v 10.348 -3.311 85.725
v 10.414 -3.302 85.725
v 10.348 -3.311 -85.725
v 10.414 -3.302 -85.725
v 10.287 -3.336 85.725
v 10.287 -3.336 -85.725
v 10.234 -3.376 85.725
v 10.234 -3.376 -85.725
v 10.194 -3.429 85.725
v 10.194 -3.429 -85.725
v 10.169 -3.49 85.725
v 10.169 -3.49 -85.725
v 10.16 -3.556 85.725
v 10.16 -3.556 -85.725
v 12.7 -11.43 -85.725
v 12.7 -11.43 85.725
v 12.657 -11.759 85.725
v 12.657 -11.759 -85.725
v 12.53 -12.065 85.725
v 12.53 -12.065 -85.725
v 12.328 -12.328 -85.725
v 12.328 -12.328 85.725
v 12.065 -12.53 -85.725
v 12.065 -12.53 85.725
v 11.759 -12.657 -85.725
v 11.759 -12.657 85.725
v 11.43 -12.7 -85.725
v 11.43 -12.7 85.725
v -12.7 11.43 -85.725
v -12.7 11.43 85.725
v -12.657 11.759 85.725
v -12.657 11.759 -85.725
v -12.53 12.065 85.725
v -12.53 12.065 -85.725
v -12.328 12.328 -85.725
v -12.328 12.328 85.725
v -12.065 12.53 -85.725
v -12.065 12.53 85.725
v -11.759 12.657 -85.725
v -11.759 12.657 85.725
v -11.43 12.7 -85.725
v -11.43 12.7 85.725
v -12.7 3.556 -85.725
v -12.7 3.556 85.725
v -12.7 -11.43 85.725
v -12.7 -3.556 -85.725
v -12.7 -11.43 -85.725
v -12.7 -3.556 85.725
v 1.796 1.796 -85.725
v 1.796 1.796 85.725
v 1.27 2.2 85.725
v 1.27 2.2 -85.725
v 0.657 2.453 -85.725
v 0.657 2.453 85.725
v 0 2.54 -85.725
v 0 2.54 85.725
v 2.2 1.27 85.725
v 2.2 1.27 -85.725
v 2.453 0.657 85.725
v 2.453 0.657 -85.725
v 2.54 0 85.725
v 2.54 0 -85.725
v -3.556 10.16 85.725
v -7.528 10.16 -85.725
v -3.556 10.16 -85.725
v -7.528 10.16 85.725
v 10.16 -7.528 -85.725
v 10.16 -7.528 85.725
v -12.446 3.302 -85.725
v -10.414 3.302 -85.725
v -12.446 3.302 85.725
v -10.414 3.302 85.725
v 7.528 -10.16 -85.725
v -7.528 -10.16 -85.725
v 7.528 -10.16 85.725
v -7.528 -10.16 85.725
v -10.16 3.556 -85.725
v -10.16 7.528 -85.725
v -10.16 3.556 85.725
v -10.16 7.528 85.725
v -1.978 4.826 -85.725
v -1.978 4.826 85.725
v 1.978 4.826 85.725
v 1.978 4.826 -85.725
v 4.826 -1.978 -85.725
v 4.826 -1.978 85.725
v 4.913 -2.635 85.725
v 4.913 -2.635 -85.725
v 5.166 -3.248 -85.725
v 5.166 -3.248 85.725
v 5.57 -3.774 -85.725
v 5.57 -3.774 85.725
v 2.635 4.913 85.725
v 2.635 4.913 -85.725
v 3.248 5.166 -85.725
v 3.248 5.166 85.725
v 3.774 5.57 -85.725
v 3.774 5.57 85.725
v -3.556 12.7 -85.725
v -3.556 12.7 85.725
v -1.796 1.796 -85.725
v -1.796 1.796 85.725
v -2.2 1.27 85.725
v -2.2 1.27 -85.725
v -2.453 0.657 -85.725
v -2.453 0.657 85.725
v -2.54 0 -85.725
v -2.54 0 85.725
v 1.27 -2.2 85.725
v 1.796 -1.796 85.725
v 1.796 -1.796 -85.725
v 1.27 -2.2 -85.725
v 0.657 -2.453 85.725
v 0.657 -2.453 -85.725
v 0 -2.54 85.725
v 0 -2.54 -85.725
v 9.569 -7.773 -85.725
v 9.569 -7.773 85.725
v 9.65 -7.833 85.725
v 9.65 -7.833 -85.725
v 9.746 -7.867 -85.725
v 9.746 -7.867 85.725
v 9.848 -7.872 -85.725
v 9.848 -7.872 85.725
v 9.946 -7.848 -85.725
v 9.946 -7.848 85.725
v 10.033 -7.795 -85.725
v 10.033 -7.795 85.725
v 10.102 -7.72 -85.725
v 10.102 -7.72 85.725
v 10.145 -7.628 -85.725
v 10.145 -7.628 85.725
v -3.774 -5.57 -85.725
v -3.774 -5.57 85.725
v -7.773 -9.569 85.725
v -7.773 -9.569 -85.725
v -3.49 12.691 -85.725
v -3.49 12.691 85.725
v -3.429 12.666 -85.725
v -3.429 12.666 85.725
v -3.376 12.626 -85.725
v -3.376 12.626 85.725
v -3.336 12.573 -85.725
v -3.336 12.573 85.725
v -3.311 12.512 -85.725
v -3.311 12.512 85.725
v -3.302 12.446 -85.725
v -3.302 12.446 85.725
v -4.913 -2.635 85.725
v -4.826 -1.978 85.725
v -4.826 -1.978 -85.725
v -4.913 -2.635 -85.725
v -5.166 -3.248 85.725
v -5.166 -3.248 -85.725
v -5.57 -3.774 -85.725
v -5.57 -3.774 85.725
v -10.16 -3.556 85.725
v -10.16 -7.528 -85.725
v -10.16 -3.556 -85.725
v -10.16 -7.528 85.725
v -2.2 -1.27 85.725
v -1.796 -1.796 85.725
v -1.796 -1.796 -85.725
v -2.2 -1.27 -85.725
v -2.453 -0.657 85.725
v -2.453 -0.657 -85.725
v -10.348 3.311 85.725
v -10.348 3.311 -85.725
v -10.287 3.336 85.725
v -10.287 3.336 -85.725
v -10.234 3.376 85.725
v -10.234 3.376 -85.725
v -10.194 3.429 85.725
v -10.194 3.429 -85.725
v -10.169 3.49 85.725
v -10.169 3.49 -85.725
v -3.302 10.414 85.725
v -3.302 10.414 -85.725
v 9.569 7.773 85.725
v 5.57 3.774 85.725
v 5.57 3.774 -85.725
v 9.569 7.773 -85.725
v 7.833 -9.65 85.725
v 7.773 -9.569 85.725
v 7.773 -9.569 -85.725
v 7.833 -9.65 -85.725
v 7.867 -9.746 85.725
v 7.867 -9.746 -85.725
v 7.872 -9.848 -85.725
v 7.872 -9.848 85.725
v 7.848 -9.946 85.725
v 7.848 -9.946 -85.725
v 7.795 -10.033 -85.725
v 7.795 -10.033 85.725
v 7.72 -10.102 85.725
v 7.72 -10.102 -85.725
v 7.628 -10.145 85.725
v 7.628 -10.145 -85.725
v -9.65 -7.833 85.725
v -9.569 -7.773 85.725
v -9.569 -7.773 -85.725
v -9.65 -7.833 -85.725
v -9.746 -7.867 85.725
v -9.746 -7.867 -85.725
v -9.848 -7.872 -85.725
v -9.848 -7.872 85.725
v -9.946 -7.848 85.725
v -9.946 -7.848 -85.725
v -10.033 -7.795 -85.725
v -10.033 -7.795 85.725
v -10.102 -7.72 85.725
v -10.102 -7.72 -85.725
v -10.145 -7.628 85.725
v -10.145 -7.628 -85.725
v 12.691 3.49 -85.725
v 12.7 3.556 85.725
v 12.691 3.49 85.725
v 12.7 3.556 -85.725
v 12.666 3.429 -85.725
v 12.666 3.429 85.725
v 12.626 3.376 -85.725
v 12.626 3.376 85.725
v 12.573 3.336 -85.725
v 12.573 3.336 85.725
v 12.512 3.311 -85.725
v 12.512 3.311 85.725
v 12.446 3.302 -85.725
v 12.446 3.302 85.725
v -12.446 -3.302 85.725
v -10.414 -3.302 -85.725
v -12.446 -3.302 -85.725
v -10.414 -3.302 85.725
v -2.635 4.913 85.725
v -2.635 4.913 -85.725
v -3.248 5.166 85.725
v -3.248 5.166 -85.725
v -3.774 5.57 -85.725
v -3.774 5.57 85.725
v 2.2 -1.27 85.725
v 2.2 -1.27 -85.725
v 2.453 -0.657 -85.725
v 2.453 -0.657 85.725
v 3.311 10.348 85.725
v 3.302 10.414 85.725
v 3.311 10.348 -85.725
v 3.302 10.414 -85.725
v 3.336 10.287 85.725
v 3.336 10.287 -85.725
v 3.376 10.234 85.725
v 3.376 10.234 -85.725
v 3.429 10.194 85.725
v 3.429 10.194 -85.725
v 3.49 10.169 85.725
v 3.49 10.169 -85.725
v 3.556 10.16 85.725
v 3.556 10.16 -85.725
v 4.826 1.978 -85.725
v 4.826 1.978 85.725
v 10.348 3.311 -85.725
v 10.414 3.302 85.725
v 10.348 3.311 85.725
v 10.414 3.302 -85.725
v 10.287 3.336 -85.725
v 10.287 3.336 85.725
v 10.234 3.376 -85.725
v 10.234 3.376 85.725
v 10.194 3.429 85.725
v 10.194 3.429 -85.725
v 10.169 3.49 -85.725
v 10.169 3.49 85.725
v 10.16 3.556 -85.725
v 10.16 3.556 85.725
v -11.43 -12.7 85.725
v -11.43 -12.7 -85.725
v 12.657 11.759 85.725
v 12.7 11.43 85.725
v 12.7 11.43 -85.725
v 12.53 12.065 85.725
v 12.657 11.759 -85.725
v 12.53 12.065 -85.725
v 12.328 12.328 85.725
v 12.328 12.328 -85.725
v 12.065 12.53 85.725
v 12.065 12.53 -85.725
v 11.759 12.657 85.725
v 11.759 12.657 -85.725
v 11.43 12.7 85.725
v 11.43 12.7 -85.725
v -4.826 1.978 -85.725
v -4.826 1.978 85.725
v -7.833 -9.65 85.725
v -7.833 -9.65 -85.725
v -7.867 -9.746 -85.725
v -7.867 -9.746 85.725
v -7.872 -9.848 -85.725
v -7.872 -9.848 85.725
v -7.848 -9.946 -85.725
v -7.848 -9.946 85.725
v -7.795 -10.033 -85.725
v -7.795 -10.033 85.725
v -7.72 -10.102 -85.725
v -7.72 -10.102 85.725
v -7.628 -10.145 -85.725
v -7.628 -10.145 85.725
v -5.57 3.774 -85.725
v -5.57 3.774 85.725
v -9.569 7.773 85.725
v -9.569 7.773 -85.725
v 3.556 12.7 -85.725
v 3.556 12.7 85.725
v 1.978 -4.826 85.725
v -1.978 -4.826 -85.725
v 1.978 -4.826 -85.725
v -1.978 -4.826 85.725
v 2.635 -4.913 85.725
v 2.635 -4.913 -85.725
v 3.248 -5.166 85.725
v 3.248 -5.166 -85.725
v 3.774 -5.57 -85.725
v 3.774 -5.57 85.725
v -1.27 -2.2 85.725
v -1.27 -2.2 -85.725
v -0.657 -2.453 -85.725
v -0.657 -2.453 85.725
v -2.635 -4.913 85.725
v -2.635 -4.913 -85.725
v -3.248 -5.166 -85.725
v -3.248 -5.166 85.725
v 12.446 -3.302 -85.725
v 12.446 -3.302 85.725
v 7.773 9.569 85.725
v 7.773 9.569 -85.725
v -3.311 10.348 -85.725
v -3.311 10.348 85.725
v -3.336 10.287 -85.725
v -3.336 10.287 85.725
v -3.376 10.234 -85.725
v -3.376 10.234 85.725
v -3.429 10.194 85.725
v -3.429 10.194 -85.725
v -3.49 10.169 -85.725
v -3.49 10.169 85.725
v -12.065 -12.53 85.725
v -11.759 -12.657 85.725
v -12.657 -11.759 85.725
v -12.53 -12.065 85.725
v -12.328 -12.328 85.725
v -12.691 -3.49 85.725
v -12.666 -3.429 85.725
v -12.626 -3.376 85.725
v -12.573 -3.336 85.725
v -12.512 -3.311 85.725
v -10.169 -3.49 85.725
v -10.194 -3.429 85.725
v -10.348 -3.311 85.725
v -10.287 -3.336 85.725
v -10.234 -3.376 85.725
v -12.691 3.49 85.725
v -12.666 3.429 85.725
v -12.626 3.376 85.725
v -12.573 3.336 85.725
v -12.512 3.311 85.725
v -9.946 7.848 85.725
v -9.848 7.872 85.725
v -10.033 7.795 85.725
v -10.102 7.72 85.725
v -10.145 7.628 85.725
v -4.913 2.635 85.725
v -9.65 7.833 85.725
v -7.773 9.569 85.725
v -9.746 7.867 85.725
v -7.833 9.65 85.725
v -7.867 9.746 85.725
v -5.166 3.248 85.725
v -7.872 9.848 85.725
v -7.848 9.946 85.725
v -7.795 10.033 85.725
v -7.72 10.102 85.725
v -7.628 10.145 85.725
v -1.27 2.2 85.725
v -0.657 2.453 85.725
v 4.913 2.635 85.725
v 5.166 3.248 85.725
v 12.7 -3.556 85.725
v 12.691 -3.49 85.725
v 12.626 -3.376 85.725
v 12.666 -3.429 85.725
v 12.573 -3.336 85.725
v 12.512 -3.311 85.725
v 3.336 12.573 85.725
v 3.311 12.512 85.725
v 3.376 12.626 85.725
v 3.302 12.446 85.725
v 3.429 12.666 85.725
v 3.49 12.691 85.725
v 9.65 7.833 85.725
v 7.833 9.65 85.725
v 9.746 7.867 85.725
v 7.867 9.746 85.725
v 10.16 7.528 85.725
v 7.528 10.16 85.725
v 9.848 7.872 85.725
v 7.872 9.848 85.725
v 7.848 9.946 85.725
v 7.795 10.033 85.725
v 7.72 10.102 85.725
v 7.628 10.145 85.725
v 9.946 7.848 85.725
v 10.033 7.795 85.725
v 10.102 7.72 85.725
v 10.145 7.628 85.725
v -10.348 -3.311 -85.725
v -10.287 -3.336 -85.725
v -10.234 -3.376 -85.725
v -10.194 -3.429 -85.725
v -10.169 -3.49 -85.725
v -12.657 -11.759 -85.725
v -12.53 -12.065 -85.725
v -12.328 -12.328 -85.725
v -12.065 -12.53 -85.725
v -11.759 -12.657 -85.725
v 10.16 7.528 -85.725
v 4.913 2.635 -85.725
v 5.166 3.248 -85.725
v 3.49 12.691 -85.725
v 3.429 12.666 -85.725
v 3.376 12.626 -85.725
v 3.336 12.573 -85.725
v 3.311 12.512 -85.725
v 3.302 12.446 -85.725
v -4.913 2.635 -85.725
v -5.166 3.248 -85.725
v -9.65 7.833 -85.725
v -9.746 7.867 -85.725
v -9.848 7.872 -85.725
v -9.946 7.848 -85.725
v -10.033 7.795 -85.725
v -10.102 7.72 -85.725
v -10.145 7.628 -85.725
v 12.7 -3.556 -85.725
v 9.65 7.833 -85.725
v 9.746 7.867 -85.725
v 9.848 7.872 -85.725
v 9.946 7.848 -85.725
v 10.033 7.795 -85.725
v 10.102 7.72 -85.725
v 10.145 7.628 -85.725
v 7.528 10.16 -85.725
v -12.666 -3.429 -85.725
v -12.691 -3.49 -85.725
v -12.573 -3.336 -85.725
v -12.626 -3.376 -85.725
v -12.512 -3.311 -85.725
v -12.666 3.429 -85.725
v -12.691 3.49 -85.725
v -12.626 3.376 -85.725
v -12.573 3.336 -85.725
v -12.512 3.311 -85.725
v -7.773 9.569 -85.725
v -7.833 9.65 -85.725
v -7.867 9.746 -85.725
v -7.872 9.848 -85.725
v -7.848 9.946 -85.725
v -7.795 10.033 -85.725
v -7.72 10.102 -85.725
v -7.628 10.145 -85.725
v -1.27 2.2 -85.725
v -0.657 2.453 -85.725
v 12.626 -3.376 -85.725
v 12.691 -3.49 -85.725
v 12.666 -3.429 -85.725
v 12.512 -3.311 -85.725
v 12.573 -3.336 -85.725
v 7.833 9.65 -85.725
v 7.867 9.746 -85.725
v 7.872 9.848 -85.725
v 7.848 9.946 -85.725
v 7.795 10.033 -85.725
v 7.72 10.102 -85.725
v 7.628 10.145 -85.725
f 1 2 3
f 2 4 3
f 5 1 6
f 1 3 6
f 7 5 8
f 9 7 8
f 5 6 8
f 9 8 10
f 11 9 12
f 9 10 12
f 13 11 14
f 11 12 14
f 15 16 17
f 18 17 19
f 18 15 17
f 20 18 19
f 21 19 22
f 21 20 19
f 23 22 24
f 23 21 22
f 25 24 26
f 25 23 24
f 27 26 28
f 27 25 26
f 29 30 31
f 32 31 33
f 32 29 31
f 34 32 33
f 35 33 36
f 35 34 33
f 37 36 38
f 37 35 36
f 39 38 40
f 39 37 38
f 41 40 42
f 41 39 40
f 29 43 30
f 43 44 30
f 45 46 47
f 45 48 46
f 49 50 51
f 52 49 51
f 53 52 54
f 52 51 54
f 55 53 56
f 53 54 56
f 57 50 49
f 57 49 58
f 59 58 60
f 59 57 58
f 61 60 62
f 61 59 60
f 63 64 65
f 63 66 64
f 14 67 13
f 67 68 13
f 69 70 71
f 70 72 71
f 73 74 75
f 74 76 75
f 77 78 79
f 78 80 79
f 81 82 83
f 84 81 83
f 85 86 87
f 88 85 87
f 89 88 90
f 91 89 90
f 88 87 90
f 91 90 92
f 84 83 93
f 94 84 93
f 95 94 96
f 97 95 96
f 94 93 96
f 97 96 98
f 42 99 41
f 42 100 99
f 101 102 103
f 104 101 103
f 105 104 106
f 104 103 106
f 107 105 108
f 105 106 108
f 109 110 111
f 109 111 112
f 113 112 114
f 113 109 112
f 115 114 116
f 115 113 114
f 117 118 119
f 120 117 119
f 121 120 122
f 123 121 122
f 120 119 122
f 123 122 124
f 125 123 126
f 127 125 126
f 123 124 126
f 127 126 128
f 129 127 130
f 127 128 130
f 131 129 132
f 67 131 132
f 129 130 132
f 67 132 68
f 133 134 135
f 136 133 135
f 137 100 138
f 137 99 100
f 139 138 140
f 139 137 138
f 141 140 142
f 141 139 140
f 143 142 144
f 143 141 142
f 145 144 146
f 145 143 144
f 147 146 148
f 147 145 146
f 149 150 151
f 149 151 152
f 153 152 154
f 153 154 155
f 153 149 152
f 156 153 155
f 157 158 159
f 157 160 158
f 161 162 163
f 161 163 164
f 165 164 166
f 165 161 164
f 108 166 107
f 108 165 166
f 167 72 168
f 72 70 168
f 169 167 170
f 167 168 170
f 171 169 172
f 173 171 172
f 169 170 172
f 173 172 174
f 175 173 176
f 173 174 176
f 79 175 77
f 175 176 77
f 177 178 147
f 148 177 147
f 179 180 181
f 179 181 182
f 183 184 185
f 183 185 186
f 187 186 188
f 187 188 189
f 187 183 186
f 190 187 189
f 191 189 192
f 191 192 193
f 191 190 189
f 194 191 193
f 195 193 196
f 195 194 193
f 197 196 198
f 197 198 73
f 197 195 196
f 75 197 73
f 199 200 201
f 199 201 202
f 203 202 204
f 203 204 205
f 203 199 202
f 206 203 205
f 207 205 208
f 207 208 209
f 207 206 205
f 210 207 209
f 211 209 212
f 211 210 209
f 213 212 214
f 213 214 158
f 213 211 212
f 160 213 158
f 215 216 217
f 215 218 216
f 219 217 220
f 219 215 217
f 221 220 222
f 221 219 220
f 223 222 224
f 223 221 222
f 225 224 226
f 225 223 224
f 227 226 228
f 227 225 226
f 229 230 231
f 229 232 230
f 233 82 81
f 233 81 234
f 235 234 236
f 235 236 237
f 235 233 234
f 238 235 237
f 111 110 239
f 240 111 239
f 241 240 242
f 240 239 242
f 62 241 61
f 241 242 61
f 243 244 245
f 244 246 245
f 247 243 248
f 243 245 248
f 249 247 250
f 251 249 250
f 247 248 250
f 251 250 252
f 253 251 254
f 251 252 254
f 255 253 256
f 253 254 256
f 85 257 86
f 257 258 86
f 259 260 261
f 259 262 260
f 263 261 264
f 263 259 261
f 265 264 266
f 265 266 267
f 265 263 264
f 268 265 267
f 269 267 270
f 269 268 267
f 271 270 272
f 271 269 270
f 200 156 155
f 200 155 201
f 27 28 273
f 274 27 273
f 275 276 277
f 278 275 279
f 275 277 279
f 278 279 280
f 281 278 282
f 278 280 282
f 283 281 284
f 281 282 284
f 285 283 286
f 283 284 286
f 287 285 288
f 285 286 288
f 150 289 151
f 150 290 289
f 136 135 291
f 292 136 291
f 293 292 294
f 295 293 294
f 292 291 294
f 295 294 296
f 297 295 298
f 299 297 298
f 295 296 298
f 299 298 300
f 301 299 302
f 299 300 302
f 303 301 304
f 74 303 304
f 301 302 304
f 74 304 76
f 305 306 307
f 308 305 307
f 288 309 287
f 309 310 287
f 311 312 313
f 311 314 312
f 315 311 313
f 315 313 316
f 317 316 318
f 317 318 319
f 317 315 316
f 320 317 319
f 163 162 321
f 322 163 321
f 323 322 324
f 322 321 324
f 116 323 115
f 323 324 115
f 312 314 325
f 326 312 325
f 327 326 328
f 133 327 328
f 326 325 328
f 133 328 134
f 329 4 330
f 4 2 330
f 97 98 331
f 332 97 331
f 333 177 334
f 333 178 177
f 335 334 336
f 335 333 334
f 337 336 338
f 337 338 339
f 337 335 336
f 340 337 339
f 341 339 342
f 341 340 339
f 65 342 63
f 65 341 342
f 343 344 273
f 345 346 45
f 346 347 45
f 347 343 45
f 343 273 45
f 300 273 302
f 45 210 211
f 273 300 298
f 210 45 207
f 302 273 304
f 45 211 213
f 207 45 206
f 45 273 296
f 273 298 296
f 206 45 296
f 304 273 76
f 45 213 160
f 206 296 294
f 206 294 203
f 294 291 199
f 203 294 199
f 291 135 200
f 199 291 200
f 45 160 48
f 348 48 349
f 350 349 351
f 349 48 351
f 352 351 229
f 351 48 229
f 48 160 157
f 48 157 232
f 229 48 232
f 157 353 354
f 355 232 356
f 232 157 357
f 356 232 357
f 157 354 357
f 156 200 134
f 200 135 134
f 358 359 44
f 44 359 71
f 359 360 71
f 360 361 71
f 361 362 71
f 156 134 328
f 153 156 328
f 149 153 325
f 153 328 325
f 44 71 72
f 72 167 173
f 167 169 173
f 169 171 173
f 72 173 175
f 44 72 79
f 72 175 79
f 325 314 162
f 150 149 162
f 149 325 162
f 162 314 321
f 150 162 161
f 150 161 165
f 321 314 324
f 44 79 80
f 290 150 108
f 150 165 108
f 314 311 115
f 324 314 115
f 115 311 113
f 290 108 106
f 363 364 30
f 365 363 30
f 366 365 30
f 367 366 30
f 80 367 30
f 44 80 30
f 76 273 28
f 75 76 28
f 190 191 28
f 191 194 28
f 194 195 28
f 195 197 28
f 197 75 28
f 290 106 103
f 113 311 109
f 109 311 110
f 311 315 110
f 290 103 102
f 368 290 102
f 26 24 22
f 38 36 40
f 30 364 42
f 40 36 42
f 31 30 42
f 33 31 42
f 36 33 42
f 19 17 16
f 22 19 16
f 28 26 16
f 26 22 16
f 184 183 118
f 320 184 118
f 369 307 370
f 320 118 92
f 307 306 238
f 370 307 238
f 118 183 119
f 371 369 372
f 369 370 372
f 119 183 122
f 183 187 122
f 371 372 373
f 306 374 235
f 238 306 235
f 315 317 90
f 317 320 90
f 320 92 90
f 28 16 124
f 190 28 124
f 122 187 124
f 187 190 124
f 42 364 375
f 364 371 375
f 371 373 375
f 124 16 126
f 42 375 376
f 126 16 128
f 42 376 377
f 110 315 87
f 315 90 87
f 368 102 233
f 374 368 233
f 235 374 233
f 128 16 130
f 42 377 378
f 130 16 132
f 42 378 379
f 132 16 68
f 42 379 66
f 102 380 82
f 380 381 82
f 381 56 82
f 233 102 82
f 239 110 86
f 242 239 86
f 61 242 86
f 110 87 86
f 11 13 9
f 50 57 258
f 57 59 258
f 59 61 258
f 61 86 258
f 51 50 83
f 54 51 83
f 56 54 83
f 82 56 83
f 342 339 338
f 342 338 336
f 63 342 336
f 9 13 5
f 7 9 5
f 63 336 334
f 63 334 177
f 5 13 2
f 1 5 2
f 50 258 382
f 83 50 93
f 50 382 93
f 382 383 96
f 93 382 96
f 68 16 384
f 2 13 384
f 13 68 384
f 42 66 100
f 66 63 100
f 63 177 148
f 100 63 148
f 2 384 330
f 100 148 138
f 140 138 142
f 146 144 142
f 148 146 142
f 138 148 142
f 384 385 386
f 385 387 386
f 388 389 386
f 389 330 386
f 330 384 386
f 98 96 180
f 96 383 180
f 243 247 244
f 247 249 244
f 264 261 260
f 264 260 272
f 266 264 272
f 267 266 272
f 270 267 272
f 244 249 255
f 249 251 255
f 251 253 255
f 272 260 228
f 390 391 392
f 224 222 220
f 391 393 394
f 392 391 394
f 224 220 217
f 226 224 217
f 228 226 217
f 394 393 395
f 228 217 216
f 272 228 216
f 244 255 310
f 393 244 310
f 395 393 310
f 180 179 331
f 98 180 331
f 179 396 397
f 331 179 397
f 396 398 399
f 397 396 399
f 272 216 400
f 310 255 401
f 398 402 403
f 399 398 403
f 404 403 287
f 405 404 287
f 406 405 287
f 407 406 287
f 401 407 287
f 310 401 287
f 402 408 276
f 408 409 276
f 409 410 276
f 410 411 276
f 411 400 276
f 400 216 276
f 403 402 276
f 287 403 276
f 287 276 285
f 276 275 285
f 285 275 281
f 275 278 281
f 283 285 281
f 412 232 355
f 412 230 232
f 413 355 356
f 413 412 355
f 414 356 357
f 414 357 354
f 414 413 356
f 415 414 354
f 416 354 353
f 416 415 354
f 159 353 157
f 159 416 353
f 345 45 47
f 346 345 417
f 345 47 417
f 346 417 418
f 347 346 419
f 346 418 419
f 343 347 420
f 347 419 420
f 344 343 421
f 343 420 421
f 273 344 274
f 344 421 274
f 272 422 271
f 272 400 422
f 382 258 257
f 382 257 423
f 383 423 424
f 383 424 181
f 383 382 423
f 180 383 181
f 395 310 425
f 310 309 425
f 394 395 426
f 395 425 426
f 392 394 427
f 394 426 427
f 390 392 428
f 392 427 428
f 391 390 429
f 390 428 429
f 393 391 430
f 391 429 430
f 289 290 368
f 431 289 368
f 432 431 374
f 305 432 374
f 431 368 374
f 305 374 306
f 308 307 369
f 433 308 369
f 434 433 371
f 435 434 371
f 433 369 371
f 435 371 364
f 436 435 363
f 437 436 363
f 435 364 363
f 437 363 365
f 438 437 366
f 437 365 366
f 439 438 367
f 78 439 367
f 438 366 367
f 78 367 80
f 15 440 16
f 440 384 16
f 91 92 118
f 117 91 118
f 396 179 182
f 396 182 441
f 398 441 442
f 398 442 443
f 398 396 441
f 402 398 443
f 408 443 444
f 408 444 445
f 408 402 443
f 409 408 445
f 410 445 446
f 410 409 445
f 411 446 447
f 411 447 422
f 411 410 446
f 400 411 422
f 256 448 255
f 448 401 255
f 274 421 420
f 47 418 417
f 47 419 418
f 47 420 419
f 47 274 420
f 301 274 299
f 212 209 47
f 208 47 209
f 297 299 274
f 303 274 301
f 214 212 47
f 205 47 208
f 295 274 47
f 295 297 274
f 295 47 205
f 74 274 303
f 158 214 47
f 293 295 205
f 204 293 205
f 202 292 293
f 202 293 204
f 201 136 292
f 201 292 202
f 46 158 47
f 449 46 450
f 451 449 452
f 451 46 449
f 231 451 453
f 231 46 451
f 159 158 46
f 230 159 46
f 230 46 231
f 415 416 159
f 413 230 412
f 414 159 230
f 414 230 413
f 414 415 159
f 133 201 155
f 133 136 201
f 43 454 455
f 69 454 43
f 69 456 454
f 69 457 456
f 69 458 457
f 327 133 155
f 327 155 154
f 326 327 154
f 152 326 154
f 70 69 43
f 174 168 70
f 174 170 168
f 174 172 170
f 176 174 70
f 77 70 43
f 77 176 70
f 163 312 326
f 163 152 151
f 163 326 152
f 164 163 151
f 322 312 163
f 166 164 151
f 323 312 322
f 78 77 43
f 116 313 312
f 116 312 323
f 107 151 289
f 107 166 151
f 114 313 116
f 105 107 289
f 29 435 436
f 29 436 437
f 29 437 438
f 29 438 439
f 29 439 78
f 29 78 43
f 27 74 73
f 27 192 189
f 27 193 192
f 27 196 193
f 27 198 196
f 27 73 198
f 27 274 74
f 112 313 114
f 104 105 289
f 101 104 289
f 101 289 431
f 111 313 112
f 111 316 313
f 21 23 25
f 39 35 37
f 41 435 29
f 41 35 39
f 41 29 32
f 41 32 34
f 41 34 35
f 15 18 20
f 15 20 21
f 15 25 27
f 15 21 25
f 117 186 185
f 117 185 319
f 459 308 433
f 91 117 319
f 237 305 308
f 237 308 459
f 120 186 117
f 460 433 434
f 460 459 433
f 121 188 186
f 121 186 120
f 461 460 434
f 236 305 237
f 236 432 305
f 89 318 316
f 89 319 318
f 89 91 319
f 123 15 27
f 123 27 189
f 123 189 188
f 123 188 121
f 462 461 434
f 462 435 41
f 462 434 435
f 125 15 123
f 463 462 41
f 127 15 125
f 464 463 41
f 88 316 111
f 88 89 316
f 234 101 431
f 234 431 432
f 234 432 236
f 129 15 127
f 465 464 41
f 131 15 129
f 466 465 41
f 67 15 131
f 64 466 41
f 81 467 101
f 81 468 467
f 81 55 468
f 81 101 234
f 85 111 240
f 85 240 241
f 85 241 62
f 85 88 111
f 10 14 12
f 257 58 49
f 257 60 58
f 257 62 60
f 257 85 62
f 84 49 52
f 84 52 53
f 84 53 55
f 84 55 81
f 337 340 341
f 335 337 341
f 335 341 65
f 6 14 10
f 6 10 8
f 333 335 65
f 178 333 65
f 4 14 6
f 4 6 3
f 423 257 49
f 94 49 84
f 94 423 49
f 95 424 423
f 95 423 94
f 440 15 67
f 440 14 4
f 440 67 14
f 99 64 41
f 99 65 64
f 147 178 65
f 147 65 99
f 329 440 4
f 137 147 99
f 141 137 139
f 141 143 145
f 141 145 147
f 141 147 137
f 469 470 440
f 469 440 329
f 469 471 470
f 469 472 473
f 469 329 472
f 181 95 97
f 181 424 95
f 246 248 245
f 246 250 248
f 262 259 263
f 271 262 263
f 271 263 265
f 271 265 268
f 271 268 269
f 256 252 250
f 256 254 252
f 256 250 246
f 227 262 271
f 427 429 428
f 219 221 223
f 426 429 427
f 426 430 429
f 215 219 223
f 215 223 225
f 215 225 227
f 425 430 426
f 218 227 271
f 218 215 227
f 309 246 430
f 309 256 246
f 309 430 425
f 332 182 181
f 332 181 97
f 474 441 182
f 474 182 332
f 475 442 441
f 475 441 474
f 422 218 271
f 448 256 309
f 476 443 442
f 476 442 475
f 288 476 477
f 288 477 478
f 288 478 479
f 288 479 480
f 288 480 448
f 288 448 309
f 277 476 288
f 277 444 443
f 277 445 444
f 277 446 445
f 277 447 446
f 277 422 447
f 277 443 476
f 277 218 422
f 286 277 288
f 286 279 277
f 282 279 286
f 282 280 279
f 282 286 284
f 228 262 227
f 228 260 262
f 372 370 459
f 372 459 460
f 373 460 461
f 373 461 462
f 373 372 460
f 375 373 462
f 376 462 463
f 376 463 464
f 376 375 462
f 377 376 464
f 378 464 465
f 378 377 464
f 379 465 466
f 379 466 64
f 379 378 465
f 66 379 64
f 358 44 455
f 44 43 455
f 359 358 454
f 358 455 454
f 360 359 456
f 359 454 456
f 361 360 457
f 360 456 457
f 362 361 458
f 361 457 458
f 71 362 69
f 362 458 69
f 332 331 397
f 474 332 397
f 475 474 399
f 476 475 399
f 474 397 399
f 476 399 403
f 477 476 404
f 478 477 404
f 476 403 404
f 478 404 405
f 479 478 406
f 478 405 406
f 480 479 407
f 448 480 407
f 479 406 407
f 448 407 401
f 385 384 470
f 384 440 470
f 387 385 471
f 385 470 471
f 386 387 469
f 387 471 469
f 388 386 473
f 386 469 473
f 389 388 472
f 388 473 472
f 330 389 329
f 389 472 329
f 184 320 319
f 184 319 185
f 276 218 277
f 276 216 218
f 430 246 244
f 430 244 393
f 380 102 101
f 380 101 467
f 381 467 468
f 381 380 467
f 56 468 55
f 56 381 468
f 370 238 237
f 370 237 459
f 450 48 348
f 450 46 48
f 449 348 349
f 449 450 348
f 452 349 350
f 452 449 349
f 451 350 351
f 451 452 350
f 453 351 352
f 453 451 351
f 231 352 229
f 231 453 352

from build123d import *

# Parameters (mm, degrees)
BOSS_EXTRUDE1_DEPTH = 85.725
FILLET2_R           = 0.254
FILLET1_R           = 1.27
SKETCH5_W           = 7.112
SKETCH5_H           = 2.54
BOSS_EXTRUDE2_DEPTH = 171.45


with BuildPart() as part:
    # Sketch3 → Boss-Extrude1 (new body, symmetric)
    with BuildSketch(Plane.XY):
        with BuildLine():
            Line((-12.7, 12.7), (-1.796051224, 1.796051224))
            ThreePointArc((-1.796051224, 1.796051224), (-0.972015918, 2.346654013), (0, 2.54))
            Line((0, 2.54), (0, 4.826))
            Line((0, 4.826), (-1.977846327, 4.826))
            ThreePointArc((-1.977846327, 4.826), (-2.949862246, 5.019345987), (-3.773897552, 5.569948776))
            Line((-3.773897552, 5.569948776), (-7.772528286, 9.56857951))
            ThreePointArc((-7.772528286, 9.56857951), (-7.847628361, 9.946133082), (-7.527553898, 10.16))
            Line((-7.527553898, 10.16), (-3.302, 10.16))
            Line((-3.302, 10.16), (-3.302, 12.7))
            Line((-3.302, 12.7), (-12.7, 12.7))
        make_face()
    extrude(amount=BOSS_EXTRUDE1_DEPTH, both=True)

    # Fillet2
    fillet2_edges = [part.edges().sort_by_distance(p)[0] for p in [
        (-3.302, 12.7, 0),
        (-3.302, 10.16, 0),
    ]]
    fillet(fillet2_edges, radius=FILLET2_R)

    # Mirror1: part across plane


with BuildPart() as part_1:
    add(part.part)
    add(part.part.mirror(Plane(origin=(0, 0, 85.725), x_dir=(0, 0, 1), z_dir=(0.707106781, 0.707106781, 0))))

    # Fillet1
    fillet1_edges = [part_1.edges().sort_by_distance(p)[0] for p in [
        (-12.7, 12.7, 0),
    ]]
    fillet(fillet1_edges, radius=FILLET1_R)

    # Mirror2: part across plane


with BuildPart() as part_2:
    add(part_1.part)
    add(part_1.part.mirror(Plane(origin=(0, 0, 85.725), x_dir=(0, 0, 1), z_dir=(0, 1, 0))))

    # Mirror5: part across plane


with BuildPart() as part_3:
    add(part_2.part)
    add(part_2.part.mirror(Plane(origin=(0, 0, 85.725), x_dir=(0, 0, 1), z_dir=(-1, 0, 0))))

    # Sketch5 → Boss-Extrude2 (add, through all)
    with BuildSketch(Plane.XY.offset(85.725)):
        with Locations((0, -11.43)):
            Rectangle(SKETCH5_W, SKETCH5_H)
    extrude(amount=-BOSS_EXTRUDE2_DEPTH)


solid = part_3.part
